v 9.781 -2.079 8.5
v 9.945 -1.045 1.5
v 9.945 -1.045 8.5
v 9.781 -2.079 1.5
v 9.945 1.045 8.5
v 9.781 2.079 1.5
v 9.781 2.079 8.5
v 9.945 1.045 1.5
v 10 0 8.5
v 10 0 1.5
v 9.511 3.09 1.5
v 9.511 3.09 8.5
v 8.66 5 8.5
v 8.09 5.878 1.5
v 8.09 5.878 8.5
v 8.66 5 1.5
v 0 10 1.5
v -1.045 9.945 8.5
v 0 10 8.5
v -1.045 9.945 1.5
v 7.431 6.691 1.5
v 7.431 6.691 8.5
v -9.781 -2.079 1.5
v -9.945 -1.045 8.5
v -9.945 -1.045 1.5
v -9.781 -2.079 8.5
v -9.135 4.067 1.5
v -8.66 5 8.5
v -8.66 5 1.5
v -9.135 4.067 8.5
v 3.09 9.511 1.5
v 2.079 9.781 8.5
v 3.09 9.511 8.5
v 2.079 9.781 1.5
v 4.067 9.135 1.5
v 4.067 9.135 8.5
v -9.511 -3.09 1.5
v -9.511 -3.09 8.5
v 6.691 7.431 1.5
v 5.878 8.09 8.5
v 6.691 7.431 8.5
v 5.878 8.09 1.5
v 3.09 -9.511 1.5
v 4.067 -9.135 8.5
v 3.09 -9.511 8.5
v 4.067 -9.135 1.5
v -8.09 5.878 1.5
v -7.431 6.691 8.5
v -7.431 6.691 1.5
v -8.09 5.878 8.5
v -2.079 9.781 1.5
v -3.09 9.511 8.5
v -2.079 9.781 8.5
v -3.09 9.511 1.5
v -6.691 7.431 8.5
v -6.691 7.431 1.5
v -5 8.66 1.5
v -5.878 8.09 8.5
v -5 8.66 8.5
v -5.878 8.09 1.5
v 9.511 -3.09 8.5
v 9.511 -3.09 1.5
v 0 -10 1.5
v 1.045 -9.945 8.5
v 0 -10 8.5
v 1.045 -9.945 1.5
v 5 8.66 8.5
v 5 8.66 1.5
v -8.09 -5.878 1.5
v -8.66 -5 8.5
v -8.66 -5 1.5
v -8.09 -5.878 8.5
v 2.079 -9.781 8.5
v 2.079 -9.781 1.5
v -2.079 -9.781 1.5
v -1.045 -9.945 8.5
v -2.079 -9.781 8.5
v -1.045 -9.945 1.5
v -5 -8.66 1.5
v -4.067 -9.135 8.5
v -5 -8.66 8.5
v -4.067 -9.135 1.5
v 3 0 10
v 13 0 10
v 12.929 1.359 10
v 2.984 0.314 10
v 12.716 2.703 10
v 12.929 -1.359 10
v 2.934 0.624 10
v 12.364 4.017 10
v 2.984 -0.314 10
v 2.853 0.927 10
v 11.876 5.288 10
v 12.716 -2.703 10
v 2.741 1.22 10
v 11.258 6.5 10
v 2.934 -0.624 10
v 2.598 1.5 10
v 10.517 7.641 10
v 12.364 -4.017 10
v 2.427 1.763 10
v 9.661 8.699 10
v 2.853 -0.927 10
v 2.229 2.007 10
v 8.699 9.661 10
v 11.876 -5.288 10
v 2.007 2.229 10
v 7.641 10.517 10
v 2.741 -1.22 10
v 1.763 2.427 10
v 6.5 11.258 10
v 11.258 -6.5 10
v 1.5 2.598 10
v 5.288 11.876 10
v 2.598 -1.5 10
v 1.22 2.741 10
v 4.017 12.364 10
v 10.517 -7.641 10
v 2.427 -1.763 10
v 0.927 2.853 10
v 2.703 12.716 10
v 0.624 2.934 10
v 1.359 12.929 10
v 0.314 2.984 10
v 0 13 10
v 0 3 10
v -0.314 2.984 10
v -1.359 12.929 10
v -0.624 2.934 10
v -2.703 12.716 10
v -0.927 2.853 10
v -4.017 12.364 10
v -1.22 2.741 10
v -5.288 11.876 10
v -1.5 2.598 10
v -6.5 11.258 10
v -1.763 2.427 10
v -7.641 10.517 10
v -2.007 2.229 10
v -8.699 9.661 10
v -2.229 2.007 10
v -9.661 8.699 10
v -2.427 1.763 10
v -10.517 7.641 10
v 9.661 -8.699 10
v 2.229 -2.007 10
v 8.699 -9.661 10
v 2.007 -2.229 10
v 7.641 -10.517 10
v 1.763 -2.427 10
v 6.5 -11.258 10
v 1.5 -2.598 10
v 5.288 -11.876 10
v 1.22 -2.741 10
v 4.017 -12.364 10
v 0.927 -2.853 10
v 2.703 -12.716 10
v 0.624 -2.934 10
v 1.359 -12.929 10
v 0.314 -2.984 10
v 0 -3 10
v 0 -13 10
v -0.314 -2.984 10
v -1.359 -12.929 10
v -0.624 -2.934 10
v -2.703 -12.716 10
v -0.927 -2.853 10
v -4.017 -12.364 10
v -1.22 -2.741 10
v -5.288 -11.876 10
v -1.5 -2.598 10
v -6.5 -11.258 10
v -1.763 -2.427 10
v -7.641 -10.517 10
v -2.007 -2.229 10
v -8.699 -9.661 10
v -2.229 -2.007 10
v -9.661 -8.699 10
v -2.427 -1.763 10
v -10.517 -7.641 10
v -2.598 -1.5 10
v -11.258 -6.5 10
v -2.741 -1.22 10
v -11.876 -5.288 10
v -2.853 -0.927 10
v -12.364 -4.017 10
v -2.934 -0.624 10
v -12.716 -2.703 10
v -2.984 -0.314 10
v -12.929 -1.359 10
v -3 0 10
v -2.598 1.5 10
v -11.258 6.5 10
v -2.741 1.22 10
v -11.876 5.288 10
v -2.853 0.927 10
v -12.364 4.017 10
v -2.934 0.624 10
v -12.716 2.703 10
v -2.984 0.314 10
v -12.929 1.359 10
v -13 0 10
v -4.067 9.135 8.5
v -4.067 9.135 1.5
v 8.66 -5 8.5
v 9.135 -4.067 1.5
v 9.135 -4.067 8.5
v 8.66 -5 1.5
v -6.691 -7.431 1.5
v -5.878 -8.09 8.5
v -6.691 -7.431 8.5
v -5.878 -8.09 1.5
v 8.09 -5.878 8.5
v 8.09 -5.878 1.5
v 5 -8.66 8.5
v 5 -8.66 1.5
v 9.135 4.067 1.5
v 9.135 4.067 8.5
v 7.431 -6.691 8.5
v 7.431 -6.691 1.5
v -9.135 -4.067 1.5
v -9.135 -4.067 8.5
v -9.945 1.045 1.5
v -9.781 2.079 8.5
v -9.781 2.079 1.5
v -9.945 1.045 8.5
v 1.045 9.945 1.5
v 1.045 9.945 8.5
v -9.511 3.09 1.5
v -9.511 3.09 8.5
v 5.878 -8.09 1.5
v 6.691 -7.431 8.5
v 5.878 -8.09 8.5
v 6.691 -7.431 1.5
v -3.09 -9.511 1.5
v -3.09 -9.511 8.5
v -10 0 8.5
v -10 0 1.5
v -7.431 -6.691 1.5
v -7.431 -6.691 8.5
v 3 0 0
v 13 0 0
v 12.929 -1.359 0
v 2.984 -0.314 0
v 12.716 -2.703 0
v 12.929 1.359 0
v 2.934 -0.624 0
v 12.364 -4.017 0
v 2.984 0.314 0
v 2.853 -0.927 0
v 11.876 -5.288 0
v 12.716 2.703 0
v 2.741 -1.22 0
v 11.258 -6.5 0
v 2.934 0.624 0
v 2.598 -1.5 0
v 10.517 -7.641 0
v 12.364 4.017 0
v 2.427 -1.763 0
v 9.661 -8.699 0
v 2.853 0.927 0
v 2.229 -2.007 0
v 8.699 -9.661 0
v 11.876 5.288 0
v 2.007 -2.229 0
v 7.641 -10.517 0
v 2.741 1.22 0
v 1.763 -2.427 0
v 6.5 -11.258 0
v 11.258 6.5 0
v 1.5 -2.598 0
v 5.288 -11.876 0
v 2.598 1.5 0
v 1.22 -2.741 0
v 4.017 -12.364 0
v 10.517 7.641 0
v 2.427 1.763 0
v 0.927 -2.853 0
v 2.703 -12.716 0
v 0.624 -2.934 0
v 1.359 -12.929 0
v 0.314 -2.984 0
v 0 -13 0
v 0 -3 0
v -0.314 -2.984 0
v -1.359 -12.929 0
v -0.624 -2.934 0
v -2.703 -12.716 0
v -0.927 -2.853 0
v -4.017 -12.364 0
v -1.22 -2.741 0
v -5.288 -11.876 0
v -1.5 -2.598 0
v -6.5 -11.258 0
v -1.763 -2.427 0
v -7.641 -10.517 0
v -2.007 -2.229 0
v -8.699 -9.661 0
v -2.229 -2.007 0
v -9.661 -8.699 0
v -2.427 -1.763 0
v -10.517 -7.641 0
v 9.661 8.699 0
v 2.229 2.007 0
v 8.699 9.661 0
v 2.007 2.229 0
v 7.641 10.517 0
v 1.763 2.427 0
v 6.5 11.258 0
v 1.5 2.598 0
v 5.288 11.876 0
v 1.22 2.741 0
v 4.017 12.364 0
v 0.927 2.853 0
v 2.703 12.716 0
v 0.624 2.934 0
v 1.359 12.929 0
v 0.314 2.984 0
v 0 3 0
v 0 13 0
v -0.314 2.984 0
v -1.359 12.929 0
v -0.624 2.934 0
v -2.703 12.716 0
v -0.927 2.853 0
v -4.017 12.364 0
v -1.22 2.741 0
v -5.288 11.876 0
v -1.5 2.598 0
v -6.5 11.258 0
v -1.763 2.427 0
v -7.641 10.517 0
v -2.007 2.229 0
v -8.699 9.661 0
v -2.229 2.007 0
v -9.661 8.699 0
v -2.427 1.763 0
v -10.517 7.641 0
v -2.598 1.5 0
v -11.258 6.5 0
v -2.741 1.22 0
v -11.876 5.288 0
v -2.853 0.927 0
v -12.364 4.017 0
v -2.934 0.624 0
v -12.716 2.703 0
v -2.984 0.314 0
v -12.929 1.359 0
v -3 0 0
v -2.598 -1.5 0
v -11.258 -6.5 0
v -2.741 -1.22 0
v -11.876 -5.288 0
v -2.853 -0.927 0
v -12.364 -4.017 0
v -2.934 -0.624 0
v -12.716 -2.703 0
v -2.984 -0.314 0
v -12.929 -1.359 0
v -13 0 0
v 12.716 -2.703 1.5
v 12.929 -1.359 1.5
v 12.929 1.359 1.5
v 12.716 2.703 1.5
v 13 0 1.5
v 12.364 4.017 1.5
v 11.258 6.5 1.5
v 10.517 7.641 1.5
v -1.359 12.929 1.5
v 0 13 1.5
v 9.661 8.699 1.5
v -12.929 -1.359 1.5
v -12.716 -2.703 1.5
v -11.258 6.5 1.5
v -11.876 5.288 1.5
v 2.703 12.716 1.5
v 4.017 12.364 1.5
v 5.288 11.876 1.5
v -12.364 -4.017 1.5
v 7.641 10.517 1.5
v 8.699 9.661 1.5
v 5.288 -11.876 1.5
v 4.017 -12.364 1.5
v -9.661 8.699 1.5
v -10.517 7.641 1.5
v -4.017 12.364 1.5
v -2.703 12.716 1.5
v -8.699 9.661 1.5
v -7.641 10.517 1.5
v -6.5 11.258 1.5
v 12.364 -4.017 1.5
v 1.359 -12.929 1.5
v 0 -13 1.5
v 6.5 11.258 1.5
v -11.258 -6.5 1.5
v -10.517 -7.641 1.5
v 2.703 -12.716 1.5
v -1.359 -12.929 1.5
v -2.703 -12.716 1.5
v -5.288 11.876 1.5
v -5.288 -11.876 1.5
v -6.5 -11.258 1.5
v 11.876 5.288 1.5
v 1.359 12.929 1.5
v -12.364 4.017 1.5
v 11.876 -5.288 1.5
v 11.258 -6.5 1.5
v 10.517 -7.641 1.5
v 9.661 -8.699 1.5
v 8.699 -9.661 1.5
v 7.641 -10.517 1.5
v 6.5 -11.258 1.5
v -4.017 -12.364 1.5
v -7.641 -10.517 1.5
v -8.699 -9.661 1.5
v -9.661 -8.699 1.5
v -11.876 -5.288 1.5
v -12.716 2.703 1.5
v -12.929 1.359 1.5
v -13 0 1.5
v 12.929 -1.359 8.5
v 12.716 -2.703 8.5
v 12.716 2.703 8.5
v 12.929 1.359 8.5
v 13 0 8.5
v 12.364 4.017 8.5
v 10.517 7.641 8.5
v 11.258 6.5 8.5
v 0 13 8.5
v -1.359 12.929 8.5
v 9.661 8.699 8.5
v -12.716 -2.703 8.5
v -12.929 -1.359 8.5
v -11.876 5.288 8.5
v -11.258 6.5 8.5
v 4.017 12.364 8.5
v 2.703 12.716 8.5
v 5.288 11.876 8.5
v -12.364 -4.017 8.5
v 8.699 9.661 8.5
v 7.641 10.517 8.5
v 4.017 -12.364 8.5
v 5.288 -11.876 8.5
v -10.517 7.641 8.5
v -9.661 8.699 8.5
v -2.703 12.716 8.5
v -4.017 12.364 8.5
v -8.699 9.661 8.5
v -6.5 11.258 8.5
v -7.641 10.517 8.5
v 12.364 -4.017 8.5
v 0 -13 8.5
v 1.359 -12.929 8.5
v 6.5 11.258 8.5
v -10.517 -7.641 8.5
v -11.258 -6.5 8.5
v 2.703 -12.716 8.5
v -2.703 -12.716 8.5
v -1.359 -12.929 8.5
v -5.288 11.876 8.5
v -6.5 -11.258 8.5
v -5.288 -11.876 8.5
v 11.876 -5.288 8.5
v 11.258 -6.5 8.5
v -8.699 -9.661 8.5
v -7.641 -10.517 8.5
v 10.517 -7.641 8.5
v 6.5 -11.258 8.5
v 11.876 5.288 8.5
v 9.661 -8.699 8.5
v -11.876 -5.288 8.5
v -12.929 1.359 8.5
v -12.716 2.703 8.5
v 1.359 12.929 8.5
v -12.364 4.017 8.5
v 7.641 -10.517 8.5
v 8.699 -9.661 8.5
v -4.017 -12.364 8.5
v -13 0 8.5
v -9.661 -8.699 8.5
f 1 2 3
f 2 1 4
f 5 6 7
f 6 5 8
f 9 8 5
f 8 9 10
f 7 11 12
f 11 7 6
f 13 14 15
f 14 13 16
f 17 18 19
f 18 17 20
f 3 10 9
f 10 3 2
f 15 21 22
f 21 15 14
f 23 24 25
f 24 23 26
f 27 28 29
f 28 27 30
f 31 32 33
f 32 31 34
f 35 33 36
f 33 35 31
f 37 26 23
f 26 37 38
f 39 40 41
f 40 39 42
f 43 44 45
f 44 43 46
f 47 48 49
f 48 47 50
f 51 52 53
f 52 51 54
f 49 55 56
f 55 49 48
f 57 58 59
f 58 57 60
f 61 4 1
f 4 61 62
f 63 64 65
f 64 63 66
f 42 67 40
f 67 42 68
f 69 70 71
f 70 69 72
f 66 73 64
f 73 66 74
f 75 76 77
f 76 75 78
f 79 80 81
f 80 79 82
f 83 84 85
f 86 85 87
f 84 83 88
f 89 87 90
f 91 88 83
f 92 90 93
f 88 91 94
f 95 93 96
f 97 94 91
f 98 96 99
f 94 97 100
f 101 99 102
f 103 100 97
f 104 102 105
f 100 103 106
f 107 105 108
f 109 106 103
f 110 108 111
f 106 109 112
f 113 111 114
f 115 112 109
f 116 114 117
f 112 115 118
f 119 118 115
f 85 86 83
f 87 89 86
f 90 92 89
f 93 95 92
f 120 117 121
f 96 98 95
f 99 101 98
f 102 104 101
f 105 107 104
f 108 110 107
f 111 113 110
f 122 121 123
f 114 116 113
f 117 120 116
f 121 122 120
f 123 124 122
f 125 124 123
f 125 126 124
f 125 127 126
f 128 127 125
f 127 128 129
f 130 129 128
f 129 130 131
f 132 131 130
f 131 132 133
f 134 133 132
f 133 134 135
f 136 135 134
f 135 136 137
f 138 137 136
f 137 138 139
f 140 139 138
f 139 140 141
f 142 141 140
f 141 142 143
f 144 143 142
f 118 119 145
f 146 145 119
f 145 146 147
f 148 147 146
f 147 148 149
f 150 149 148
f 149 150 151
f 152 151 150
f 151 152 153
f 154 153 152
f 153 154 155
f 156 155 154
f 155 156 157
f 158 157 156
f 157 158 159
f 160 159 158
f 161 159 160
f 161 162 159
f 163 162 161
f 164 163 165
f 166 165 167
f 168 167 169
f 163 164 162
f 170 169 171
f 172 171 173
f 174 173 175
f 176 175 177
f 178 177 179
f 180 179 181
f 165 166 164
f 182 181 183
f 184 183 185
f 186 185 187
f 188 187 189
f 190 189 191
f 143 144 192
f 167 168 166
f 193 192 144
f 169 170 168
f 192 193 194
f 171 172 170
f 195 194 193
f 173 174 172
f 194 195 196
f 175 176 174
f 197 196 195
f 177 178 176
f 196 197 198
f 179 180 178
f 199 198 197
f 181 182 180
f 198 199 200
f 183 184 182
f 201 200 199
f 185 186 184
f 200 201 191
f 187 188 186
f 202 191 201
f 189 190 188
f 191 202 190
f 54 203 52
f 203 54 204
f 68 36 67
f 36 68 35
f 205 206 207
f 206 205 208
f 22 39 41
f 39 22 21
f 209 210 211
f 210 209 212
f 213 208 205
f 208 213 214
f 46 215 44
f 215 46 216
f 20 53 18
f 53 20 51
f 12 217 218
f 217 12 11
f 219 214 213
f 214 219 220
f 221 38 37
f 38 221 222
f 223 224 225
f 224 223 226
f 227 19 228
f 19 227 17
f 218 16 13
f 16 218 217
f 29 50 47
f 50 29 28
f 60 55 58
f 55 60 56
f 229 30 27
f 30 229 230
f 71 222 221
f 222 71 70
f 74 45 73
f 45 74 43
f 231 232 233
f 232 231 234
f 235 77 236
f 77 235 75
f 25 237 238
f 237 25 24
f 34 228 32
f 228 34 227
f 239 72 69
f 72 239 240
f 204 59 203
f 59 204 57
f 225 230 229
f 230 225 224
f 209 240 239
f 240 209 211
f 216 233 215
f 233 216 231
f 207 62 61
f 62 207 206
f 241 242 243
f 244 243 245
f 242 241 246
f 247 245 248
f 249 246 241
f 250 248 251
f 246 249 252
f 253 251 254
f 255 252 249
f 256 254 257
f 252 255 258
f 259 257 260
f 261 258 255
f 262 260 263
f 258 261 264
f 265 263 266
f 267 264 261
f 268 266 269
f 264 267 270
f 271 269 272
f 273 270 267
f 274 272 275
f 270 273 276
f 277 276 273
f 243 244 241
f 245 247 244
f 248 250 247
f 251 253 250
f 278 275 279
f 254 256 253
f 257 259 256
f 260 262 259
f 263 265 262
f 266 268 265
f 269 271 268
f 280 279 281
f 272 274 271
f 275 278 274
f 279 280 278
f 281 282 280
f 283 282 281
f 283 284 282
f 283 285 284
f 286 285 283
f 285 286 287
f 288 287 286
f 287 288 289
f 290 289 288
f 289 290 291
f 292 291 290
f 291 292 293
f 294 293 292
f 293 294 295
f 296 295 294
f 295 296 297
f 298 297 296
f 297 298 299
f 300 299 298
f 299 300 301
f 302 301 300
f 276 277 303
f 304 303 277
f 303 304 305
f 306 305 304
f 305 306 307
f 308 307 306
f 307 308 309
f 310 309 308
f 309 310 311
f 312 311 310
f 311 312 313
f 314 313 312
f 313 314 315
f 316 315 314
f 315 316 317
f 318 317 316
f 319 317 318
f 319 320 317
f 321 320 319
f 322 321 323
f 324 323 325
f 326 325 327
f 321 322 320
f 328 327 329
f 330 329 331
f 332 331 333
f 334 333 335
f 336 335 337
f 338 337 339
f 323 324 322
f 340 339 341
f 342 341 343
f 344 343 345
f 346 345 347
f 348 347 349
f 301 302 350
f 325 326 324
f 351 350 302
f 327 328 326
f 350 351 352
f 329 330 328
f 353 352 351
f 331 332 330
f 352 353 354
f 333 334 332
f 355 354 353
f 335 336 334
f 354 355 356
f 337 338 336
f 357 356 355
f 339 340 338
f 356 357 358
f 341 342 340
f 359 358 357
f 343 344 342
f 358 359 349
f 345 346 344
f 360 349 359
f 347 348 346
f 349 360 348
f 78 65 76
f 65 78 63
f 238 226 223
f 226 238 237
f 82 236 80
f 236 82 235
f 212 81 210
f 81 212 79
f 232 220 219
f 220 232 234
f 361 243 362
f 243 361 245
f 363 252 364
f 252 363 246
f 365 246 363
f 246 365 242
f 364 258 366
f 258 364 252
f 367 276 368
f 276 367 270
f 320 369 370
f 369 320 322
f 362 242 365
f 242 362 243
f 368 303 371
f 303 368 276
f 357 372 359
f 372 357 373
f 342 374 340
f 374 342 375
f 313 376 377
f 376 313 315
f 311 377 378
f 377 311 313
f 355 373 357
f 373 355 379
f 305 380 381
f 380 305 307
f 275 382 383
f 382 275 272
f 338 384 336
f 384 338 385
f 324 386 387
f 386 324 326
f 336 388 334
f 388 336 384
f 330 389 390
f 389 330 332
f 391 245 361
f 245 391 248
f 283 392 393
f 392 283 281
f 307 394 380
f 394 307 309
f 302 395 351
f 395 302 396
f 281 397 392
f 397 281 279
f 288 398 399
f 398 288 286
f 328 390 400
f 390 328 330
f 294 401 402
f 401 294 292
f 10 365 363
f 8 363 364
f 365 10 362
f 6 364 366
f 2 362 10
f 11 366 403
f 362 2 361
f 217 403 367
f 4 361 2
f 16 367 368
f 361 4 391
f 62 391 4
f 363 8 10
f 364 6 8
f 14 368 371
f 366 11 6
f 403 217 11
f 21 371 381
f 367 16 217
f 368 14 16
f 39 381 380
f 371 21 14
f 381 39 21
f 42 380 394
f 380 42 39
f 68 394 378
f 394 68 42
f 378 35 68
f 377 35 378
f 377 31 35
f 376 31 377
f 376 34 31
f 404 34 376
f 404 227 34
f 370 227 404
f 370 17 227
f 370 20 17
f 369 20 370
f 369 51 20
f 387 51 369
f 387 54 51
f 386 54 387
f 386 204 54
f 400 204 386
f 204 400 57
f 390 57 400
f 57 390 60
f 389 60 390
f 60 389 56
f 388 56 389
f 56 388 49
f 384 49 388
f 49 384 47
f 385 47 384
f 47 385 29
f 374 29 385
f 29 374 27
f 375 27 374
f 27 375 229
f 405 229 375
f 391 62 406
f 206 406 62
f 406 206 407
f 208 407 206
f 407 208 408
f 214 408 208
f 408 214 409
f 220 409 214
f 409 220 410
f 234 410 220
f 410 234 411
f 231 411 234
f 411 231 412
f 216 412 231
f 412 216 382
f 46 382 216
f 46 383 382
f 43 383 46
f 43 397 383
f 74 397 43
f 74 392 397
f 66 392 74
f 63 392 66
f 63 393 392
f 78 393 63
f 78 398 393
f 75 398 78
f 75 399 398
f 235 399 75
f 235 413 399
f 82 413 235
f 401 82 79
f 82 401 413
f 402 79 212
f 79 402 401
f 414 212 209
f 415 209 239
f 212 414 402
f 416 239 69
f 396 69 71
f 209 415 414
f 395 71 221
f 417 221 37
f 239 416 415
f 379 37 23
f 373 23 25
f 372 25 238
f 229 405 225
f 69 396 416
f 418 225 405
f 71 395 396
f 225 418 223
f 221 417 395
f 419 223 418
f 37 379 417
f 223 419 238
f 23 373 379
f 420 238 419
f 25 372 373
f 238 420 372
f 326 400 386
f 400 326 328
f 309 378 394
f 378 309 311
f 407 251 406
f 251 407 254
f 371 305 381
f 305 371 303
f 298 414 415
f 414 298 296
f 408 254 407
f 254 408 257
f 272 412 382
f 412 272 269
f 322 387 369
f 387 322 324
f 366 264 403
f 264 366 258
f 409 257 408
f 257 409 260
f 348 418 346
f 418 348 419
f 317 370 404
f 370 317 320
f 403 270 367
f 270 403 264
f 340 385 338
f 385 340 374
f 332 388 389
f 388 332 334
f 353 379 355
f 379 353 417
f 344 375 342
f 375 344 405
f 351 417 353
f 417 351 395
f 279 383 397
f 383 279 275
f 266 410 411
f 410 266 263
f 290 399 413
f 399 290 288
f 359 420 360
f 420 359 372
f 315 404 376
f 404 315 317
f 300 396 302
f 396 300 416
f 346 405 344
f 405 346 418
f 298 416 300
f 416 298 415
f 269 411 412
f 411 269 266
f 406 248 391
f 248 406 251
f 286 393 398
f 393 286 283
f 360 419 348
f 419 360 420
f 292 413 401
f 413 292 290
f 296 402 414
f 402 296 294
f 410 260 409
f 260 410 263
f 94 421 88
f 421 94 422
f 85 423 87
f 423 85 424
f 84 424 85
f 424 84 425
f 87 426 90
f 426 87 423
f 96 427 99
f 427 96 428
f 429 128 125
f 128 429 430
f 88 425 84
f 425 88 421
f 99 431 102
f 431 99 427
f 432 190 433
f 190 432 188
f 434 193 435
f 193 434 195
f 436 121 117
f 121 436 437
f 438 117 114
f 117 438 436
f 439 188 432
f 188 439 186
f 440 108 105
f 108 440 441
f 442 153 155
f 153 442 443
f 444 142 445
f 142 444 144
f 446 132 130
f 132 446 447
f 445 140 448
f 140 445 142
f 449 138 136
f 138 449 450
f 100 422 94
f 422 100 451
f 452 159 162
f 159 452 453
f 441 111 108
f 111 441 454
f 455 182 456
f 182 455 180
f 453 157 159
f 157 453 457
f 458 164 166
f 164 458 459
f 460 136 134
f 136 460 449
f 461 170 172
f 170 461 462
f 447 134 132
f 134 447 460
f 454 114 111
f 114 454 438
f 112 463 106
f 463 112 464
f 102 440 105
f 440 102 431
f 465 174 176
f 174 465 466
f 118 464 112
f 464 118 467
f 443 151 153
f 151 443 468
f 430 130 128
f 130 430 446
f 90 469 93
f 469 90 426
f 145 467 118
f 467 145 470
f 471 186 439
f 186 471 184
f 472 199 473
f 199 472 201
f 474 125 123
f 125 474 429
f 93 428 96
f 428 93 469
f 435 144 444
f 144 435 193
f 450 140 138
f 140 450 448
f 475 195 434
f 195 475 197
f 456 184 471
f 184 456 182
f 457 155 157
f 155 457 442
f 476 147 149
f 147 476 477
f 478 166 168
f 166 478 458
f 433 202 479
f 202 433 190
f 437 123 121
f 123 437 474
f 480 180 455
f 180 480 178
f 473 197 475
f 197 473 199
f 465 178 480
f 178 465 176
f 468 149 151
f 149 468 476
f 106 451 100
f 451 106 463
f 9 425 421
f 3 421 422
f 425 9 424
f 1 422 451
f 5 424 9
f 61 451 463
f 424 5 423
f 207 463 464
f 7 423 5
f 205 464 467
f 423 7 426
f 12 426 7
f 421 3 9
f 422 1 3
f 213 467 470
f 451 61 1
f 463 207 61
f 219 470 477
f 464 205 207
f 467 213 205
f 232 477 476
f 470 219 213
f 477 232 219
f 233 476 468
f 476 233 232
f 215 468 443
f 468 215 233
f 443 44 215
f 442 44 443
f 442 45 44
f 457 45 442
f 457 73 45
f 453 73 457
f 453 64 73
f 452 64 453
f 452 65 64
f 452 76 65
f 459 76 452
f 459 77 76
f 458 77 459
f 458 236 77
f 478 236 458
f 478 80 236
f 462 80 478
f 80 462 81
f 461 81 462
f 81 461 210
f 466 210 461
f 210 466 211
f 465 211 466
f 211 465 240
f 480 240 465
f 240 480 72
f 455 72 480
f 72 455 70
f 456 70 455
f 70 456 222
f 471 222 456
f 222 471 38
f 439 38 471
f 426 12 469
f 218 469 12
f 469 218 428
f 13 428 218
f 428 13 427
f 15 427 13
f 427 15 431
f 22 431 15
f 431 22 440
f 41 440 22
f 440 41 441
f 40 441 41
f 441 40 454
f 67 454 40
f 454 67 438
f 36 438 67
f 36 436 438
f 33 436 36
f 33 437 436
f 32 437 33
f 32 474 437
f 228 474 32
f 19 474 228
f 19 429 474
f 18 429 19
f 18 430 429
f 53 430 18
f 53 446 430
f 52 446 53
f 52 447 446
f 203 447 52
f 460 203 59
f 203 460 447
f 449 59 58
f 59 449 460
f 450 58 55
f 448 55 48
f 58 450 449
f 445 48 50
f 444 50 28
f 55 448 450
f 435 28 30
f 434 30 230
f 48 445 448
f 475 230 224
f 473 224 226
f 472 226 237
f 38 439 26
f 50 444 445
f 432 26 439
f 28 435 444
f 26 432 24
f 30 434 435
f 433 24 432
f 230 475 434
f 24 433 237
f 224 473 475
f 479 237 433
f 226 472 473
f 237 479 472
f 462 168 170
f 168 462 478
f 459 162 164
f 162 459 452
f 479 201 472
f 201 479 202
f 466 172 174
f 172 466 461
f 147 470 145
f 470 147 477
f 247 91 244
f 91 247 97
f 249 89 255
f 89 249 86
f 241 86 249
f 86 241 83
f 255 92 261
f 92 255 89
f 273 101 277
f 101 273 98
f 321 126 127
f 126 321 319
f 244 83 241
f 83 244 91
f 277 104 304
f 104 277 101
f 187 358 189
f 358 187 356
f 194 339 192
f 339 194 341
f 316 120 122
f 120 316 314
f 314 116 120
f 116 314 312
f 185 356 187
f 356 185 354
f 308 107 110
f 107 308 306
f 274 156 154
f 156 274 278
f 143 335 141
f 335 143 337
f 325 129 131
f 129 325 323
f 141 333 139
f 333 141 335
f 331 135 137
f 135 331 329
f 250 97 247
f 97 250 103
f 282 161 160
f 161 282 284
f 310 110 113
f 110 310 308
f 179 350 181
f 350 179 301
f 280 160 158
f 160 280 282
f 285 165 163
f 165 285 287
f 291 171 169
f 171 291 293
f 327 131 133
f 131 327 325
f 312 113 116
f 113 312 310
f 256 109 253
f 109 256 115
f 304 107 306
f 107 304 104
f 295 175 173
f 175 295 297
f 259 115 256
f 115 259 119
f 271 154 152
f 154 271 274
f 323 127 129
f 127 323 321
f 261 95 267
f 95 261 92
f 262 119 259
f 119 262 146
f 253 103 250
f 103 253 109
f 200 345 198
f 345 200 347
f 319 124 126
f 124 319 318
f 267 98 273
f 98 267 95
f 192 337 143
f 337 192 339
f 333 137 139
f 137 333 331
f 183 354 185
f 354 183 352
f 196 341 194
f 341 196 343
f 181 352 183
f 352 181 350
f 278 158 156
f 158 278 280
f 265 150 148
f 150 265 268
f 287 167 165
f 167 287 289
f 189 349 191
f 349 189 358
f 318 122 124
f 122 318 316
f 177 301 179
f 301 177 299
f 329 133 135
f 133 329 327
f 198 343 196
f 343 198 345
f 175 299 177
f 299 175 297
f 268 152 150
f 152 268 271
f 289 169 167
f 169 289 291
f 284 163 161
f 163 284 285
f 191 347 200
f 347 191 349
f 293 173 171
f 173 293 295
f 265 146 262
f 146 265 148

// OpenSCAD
// Belt-guide pulley flange.
$fn = 60;
eps = 0.02;
bore_d = 6;
body_d = 20;
width = 10;
difference() { union() { cylinder(d=body_d,h=width); cylinder(d=body_d+6,h=1.5); translate([0,0,width-1.5]) cylinder(d=body_d+6,h=1.5); } translate([0,0,-eps]) cylinder(d=bore_d,h=width+2*eps); }
